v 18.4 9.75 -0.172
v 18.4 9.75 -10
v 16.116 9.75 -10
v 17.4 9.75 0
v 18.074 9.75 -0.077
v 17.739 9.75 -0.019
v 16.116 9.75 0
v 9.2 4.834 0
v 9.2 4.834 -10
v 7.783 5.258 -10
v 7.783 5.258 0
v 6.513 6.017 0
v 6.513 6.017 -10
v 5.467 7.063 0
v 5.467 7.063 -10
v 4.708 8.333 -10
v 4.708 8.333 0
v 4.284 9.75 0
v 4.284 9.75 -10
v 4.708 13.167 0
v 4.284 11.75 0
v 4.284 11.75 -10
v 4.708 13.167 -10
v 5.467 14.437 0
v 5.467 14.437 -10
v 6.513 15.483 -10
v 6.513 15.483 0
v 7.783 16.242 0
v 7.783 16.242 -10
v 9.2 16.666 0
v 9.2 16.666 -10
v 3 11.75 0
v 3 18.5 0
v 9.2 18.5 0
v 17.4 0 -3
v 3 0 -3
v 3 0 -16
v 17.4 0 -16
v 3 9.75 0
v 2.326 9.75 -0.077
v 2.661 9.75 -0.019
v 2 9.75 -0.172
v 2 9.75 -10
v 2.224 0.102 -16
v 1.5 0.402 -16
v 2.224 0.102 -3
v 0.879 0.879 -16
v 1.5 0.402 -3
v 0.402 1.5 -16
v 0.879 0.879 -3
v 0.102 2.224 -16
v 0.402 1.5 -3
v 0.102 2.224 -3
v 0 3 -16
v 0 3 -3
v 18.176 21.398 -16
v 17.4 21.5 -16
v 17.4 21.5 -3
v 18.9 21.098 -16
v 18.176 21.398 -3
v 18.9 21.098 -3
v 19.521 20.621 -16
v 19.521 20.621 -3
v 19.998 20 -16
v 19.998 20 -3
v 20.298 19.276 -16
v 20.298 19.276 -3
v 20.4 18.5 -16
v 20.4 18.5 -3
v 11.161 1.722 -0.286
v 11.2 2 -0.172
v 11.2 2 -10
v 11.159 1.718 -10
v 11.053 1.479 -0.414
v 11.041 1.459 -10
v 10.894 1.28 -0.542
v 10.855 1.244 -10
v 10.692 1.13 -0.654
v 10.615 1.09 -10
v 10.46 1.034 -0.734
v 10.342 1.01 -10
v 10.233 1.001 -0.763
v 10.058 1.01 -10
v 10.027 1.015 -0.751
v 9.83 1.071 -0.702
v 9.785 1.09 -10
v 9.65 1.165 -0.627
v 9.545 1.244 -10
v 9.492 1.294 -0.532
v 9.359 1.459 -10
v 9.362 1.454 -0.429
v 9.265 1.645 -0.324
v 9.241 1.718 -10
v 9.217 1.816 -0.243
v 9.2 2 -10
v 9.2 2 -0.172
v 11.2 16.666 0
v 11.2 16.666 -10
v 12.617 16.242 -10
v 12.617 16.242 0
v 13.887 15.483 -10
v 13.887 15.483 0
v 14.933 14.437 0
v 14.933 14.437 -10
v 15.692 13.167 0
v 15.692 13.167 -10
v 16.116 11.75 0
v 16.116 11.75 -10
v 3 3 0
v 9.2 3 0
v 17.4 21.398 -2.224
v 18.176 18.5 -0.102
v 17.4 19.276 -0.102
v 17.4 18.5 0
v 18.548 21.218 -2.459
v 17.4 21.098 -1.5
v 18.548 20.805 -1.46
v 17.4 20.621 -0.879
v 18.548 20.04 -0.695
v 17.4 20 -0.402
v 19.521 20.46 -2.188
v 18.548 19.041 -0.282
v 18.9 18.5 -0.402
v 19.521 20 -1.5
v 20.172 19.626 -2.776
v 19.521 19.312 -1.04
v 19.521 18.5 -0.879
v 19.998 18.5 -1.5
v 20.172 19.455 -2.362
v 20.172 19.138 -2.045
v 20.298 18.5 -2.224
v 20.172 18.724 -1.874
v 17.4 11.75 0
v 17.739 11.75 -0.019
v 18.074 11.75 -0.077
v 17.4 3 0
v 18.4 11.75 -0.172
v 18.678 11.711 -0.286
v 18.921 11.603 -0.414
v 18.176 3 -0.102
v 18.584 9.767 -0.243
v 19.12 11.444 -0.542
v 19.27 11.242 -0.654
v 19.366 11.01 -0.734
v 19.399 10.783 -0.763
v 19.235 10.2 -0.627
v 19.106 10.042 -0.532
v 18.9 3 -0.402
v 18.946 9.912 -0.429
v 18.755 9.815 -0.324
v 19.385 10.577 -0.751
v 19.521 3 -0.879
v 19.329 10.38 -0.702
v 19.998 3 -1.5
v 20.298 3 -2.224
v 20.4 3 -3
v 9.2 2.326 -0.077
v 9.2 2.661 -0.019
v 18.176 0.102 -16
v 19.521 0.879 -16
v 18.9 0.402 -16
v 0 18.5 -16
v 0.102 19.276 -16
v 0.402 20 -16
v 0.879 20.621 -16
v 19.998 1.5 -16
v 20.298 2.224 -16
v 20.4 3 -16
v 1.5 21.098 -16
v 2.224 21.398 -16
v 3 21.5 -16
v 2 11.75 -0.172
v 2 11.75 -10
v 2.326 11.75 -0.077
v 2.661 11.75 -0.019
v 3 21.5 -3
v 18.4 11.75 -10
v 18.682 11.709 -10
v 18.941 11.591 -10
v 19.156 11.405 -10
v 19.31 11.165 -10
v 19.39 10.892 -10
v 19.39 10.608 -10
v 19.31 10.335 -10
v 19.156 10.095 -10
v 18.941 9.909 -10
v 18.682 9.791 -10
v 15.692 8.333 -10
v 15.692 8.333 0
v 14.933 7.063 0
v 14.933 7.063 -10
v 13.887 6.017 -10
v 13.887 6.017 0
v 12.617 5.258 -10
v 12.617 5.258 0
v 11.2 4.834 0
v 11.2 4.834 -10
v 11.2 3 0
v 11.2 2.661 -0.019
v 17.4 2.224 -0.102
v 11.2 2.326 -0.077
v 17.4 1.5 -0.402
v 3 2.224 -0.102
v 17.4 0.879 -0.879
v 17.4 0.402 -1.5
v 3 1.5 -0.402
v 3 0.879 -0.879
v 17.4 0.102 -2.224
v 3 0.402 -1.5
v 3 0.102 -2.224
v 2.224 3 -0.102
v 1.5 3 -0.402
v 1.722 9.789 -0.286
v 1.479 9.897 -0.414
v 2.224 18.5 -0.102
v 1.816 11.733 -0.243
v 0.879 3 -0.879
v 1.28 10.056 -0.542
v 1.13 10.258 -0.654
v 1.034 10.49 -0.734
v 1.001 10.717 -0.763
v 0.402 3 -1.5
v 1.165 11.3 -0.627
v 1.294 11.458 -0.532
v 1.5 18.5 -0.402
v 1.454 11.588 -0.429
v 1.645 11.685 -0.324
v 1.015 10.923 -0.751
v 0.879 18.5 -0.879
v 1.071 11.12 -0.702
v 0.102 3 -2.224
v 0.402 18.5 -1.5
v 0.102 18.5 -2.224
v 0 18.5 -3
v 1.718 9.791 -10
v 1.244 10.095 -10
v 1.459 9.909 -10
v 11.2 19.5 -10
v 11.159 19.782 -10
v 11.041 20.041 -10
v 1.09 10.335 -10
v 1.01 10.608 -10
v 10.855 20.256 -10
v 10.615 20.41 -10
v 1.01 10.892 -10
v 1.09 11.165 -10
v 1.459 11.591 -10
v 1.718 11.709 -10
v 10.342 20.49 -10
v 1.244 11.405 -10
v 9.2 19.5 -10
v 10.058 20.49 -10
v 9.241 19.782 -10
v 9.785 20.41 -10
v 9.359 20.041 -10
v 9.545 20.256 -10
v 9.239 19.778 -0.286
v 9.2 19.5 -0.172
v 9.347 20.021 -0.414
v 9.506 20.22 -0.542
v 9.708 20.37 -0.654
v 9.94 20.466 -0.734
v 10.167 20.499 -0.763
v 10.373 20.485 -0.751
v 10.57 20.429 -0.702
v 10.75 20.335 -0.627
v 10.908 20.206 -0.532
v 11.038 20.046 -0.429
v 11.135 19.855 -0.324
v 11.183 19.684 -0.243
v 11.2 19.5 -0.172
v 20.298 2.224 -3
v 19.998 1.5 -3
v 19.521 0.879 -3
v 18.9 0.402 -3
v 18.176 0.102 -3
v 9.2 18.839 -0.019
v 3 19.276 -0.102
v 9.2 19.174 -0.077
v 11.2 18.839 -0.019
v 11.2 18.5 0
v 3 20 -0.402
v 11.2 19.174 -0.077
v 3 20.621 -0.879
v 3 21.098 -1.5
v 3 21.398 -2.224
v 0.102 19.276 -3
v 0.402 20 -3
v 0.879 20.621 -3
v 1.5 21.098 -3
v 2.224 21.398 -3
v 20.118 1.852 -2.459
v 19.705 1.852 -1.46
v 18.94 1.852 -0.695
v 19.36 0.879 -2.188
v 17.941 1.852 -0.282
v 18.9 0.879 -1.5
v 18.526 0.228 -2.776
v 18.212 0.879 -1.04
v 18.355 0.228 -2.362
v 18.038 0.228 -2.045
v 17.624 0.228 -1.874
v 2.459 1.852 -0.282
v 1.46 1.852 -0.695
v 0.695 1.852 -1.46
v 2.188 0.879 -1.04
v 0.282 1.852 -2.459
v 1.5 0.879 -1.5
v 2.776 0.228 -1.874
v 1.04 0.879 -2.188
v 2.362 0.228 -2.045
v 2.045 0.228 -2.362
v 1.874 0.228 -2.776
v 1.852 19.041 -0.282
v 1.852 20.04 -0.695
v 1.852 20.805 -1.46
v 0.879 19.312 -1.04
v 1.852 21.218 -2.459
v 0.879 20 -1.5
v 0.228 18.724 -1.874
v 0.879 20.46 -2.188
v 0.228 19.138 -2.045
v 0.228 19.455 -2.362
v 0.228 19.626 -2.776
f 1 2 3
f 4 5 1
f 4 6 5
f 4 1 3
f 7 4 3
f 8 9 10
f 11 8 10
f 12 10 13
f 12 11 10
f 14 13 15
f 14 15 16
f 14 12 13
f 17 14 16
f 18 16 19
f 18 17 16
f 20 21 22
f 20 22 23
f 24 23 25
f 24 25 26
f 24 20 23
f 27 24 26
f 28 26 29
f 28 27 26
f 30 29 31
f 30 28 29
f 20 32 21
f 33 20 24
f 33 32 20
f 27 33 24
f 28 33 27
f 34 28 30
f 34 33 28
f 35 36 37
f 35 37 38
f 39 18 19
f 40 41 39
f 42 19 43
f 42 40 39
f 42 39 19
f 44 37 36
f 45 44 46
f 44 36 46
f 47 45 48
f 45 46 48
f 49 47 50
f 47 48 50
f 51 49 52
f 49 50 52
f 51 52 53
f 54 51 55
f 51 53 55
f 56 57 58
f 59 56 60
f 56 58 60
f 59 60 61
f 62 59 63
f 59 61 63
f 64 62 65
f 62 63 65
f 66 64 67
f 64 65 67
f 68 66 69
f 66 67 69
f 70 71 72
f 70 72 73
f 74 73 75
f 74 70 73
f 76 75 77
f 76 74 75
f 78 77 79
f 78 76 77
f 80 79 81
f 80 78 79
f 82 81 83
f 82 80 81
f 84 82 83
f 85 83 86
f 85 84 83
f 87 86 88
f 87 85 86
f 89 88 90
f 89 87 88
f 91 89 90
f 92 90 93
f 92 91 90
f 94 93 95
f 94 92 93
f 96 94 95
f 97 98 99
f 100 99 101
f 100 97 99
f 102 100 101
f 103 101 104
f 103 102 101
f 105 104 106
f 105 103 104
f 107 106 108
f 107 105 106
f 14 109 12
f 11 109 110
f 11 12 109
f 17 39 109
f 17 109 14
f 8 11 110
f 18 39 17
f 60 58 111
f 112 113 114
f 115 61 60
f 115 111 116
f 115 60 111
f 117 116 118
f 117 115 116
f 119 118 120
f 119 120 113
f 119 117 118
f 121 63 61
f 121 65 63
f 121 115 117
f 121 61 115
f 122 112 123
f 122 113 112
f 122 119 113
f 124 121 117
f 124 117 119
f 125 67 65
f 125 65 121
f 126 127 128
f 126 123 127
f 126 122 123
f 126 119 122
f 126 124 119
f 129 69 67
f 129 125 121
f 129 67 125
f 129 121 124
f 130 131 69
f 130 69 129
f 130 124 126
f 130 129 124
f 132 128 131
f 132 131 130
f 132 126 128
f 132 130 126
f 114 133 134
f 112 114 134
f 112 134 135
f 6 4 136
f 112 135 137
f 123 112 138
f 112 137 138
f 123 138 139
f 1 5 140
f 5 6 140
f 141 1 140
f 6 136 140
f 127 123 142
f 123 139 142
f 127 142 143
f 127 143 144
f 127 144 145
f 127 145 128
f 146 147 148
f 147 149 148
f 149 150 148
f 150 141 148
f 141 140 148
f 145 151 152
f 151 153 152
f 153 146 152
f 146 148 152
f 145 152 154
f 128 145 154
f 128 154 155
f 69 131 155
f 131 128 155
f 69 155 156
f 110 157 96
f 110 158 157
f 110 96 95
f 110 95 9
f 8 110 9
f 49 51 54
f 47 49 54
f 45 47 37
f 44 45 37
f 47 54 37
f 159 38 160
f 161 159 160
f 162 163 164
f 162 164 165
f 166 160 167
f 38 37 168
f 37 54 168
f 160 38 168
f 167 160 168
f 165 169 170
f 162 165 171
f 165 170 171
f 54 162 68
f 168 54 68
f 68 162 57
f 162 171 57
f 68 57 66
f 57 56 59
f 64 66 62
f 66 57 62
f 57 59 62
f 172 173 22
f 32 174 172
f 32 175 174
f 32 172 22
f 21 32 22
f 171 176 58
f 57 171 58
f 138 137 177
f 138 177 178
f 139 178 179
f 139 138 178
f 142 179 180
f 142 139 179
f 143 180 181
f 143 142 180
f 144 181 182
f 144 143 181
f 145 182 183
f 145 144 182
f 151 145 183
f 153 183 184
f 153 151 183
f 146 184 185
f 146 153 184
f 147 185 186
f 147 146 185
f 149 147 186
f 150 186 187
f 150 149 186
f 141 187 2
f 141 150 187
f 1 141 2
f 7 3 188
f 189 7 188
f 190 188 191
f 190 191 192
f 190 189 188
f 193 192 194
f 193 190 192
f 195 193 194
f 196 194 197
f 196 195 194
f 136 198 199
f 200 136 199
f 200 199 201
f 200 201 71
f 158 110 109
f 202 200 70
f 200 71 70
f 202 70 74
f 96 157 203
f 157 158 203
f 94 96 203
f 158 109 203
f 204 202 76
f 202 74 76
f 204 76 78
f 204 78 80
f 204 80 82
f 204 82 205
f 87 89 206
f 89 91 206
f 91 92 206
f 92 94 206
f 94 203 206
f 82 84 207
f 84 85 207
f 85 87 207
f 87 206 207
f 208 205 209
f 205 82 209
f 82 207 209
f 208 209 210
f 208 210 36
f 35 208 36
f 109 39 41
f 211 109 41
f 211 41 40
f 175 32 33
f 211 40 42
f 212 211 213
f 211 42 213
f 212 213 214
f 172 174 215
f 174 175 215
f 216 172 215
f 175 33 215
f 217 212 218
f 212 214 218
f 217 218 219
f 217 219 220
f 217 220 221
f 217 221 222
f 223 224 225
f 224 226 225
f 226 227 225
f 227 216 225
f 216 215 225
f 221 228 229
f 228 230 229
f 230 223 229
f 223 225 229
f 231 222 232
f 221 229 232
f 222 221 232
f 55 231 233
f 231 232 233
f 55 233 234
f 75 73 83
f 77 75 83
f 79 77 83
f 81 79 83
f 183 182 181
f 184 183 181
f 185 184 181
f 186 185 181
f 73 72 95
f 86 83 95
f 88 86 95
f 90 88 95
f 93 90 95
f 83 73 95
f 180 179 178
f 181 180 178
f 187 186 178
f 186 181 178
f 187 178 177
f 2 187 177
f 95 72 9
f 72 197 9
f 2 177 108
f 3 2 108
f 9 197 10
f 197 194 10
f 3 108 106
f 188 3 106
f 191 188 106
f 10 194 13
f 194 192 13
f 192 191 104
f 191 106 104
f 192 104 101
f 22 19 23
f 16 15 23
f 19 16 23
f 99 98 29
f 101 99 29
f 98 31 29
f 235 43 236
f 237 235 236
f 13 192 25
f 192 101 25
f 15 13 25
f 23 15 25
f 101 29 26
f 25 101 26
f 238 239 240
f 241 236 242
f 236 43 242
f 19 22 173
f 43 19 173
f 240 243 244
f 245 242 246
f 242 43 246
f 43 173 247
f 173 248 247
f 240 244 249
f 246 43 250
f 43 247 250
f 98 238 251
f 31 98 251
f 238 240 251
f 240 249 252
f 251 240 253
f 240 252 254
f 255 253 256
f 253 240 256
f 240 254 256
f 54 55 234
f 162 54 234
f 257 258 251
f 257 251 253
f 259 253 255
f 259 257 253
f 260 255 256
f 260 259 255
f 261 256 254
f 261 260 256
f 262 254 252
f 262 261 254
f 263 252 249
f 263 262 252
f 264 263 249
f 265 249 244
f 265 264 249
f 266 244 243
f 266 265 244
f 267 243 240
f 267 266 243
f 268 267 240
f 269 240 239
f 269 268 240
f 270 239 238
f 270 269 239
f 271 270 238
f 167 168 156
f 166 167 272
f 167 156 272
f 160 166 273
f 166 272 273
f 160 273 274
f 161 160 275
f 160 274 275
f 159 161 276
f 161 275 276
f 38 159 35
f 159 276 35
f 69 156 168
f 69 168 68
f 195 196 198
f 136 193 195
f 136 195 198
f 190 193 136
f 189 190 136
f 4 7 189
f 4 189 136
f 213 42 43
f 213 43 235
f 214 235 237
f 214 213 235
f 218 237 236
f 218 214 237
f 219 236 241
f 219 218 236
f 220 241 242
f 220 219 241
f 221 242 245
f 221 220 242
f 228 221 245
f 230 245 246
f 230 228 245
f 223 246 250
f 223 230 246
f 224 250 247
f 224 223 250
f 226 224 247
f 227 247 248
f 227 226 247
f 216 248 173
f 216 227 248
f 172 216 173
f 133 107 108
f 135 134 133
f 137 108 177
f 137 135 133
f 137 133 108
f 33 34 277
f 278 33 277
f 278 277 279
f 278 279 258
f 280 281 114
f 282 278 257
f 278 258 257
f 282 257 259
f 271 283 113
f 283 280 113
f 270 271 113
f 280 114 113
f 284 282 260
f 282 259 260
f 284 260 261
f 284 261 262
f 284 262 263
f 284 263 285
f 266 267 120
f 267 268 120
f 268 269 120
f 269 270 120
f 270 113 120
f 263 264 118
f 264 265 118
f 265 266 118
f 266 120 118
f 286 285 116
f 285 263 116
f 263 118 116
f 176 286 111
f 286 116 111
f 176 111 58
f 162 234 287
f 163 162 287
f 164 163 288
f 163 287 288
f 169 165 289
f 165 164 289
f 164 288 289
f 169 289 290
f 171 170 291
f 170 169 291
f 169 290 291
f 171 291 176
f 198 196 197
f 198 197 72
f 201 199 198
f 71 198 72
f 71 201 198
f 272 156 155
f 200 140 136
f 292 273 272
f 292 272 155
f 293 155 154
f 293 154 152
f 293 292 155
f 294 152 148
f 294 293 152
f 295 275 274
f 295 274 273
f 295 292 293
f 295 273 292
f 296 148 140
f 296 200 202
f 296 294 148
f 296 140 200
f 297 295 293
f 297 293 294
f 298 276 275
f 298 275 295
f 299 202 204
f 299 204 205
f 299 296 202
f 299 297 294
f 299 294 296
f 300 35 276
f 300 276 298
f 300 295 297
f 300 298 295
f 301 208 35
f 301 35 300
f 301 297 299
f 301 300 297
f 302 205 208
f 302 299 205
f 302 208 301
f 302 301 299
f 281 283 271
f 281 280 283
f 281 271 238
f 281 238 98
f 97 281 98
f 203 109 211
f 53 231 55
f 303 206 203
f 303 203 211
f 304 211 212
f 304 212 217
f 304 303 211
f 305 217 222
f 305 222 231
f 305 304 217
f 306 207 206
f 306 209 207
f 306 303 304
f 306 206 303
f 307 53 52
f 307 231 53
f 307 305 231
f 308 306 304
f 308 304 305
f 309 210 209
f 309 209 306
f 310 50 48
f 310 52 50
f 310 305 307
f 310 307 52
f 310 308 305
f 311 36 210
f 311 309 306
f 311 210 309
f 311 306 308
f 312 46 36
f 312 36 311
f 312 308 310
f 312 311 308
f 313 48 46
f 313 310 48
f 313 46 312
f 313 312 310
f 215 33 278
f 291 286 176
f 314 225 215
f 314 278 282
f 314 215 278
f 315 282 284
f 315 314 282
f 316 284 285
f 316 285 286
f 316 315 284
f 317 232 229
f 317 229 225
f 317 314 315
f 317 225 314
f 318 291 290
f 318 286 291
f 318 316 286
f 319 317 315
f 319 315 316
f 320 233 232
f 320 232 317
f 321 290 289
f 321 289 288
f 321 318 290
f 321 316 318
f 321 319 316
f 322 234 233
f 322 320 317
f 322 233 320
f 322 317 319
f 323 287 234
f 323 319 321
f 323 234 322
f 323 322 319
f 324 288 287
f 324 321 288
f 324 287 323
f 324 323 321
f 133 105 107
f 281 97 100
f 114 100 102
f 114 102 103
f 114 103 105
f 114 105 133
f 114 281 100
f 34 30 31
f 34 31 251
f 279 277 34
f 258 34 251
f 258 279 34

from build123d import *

# Parameters (mm, degrees)
SKETCH1_W       = 20.4
SKETCH1_H       = 21.5
EXTRUDE1_DEPTH  = 16
EXTRUDE10_DEPTH = 10
FILLET8_R       = 3


with BuildPart() as part:
    # Sketch1 → Extrude1 (new body)
    with BuildSketch(Plane.XY):
        with Locations((10.2, 10.75)):
            Rectangle(SKETCH1_W, SKETCH1_H)
    extrude(amount=-EXTRUDE1_DEPTH)

    # Sketch11 → Extrude10 (cut)
    with BuildSketch(Plane.XY):
        with BuildLine():
            Line((2, 11.75), (4.283920217, 11.75))
            ThreePointArc((4.283920217, 11.75), (5.957359313, 14.992640687), (9.2, 16.666079783))
            Line((9.2, 16.666079783), (9.2, 19.5))
            ThreePointArc((9.2, 19.5), (10.2, 20.5), (11.2, 19.5))
            Line((11.2, 19.5), (11.2, 16.666079783))
            ThreePointArc((11.2, 16.666079783), (14.442640687, 14.992640687), (16.116079783, 11.75))
            Line((16.116079783, 11.75), (18.4, 11.75))
            ThreePointArc((18.4, 11.75), (19.4, 10.75), (18.4, 9.75))
            Line((18.4, 9.75), (16.116079783, 9.75))
            ThreePointArc((16.116079783, 9.75), (14.442640687, 6.507359313), (11.2, 4.833920217))
            Line((11.2, 4.833920217), (11.2, 2))
            ThreePointArc((11.2, 2), (10.2, 1), (9.2, 2))
            Line((9.2, 2), (9.2, 4.833920217))
            ThreePointArc((9.2, 4.833920217), (5.957359313, 6.507359313), (4.283920217, 9.75))
            Line((4.283920217, 9.75), (2, 9.75))
            ThreePointArc((2, 9.75), (1, 10.75), (2, 11.75))
        make_face()
    extrude(amount=-EXTRUDE10_DEPTH, mode=Mode.SUBTRACT)

    # Fillet8
    # the kernel refuses this fillet: 3 mm, written as the material it takes off along each edge
    with BuildSketch(Plane(origin=(17.4, 3, -3), x_dir=(1, 0, 0), z_dir=(0, -1, 0))) as fillet8_piece_1_section:
        Polygon((0, 0), (FILLET8_R, 0), (FILLET8_R, FILLET8_R), (0, FILLET8_R), align=None)
    fillet8_piece_1 = extrude(amount=FILLET8_R, mode=Mode.PRIVATE)
    fillet8_piece_1 = fillet8_piece_1 - Plane(origin=(17.4, 3, -3), x_dir=(-0.7071067811865475, 0, -0.7071067811865475), z_dir=(0, -1, 0)) * Sphere(FILLET8_R, mode=Mode.PRIVATE)
    add(fillet8_piece_1, mode=Mode.SUBTRACT)
    with BuildSketch(Plane(origin=(17.4, 18.5, -3), x_dir=(0, 0, 1), z_dir=(1, 0, 0))) as fillet8_piece_2_section:
        Polygon((0, 0), (FILLET8_R, 0), (FILLET8_R, -FILLET8_R), (0, -FILLET8_R), align=None)
    fillet8_piece_2 = extrude(amount=FILLET8_R, mode=Mode.PRIVATE)
    fillet8_piece_2 = fillet8_piece_2 - Plane(origin=(17.4, 18.5, -3), x_dir=(0, -0.7071067811865475, -0.7071067811865475), z_dir=(1, 0, 0)) * Sphere(FILLET8_R, mode=Mode.PRIVATE)
    add(fillet8_piece_2, mode=Mode.SUBTRACT)
    with BuildSketch(Plane(origin=(3, 3, -3), x_dir=(-1, 0, 0), z_dir=(0, -1, 0))) as fillet8_piece_3_section:
        Polygon((0, 0), (FILLET8_R, 0), (FILLET8_R, -FILLET8_R), (0, -FILLET8_R), align=None)
    fillet8_piece_3 = extrude(amount=FILLET8_R, mode=Mode.PRIVATE)
    fillet8_piece_3 = fillet8_piece_3 - Plane(origin=(3, 3, -3), x_dir=(0.7071067811865475, 0, -0.7071067811865475), z_dir=(0, -1, 0)) * Sphere(FILLET8_R, mode=Mode.PRIVATE)
    add(fillet8_piece_3, mode=Mode.SUBTRACT)
    with BuildSketch(Plane(origin=(3, 18.5, -3), x_dir=(0, 0, 1), z_dir=(-1, 0, 0))) as fillet8_piece_4_section:
        Polygon((0, 0), (FILLET8_R, 0), (FILLET8_R, FILLET8_R), (0, FILLET8_R), align=None)
    fillet8_piece_4 = extrude(amount=FILLET8_R, mode=Mode.PRIVATE)
    fillet8_piece_4 = fillet8_piece_4 - Plane(origin=(3, 18.5, -3), x_dir=(0, -0.7071067811865475, -0.7071067811865475), z_dir=(-1, 0, 0)) * Sphere(FILLET8_R, mode=Mode.PRIVATE)
    add(fillet8_piece_4, mode=Mode.SUBTRACT)
    with BuildSketch(Plane(origin=(20.4, 3, 0), x_dir=(0, 0, -1), z_dir=(0, 1, 0)), Plane(origin=(0, 18.5, 0), x_dir=(0, 0, -1), z_dir=(0, -1, 0))) as fillet8_piece_5:
        with BuildLine():
            CenterArc((FILLET8_R, FILLET8_R), FILLET8_R, 180, 90)
            Line((0, FILLET8_R), (0, 0))
            Line((0, 0), (FILLET8_R, 0))
        make_face()
    extrude(amount=15.5, mode=Mode.SUBTRACT)
    with BuildSketch(Plane(origin=(3, 0, 0), x_dir=(0, 0, -1), z_dir=(1, 0, 0))) as fillet8_piece_6:
        with BuildLine():
            CenterArc((FILLET8_R, FILLET8_R), FILLET8_R, 180, 90)
            Line((0, FILLET8_R), (0, 0))
            Line((0, 0), (FILLET8_R, 0))
        make_face()
    extrude(amount=14.4, mode=Mode.SUBTRACT)
    with BuildSketch(Plane(origin=(17.4, 21.5, 0), x_dir=(0, -1, 0), z_dir=(-1, 0, 0))) as fillet8_piece_7:
        with BuildLine():
            CenterArc((FILLET8_R, -FILLET8_R), FILLET8_R, 90, 90)
            Line((0, -FILLET8_R), (0, 0))
            Line((0, 0), (FILLET8_R, 0))
        make_face()
    extrude(amount=14.4, mode=Mode.SUBTRACT)
    with BuildSketch(Plane(origin=(20.4, 0, -3), x_dir=(-1, 0, 0), z_dir=(0, 0, -1)), Plane(origin=(20.4, 21.5, -3), x_dir=(0, -1, 0), z_dir=(0, 0, -1))) as fillet8_piece_8:
        with BuildLine():
            CenterArc((FILLET8_R, FILLET8_R), FILLET8_R, 180, 90)
            Line((0, FILLET8_R), (0, 0))
            Line((0, 0), (FILLET8_R, 0))
        make_face()
    extrude(amount=20.5, mode=Mode.SUBTRACT)
    with BuildSketch(Plane(origin=(0, 21.5, -3), x_dir=(0, -1, 0), z_dir=(0, 0, -1)), Plane(origin=(0, 0, -3), x_dir=(1, 0, 0), z_dir=(0, 0, -1))) as fillet8_piece_9:
        with BuildLine():
            CenterArc((FILLET8_R, -FILLET8_R), FILLET8_R, 90, 90)
            Line((0, -FILLET8_R), (0, 0))
            Line((0, 0), (FILLET8_R, 0))
        make_face()
    extrude(amount=20.5, mode=Mode.SUBTRACT)


solid = part.part
